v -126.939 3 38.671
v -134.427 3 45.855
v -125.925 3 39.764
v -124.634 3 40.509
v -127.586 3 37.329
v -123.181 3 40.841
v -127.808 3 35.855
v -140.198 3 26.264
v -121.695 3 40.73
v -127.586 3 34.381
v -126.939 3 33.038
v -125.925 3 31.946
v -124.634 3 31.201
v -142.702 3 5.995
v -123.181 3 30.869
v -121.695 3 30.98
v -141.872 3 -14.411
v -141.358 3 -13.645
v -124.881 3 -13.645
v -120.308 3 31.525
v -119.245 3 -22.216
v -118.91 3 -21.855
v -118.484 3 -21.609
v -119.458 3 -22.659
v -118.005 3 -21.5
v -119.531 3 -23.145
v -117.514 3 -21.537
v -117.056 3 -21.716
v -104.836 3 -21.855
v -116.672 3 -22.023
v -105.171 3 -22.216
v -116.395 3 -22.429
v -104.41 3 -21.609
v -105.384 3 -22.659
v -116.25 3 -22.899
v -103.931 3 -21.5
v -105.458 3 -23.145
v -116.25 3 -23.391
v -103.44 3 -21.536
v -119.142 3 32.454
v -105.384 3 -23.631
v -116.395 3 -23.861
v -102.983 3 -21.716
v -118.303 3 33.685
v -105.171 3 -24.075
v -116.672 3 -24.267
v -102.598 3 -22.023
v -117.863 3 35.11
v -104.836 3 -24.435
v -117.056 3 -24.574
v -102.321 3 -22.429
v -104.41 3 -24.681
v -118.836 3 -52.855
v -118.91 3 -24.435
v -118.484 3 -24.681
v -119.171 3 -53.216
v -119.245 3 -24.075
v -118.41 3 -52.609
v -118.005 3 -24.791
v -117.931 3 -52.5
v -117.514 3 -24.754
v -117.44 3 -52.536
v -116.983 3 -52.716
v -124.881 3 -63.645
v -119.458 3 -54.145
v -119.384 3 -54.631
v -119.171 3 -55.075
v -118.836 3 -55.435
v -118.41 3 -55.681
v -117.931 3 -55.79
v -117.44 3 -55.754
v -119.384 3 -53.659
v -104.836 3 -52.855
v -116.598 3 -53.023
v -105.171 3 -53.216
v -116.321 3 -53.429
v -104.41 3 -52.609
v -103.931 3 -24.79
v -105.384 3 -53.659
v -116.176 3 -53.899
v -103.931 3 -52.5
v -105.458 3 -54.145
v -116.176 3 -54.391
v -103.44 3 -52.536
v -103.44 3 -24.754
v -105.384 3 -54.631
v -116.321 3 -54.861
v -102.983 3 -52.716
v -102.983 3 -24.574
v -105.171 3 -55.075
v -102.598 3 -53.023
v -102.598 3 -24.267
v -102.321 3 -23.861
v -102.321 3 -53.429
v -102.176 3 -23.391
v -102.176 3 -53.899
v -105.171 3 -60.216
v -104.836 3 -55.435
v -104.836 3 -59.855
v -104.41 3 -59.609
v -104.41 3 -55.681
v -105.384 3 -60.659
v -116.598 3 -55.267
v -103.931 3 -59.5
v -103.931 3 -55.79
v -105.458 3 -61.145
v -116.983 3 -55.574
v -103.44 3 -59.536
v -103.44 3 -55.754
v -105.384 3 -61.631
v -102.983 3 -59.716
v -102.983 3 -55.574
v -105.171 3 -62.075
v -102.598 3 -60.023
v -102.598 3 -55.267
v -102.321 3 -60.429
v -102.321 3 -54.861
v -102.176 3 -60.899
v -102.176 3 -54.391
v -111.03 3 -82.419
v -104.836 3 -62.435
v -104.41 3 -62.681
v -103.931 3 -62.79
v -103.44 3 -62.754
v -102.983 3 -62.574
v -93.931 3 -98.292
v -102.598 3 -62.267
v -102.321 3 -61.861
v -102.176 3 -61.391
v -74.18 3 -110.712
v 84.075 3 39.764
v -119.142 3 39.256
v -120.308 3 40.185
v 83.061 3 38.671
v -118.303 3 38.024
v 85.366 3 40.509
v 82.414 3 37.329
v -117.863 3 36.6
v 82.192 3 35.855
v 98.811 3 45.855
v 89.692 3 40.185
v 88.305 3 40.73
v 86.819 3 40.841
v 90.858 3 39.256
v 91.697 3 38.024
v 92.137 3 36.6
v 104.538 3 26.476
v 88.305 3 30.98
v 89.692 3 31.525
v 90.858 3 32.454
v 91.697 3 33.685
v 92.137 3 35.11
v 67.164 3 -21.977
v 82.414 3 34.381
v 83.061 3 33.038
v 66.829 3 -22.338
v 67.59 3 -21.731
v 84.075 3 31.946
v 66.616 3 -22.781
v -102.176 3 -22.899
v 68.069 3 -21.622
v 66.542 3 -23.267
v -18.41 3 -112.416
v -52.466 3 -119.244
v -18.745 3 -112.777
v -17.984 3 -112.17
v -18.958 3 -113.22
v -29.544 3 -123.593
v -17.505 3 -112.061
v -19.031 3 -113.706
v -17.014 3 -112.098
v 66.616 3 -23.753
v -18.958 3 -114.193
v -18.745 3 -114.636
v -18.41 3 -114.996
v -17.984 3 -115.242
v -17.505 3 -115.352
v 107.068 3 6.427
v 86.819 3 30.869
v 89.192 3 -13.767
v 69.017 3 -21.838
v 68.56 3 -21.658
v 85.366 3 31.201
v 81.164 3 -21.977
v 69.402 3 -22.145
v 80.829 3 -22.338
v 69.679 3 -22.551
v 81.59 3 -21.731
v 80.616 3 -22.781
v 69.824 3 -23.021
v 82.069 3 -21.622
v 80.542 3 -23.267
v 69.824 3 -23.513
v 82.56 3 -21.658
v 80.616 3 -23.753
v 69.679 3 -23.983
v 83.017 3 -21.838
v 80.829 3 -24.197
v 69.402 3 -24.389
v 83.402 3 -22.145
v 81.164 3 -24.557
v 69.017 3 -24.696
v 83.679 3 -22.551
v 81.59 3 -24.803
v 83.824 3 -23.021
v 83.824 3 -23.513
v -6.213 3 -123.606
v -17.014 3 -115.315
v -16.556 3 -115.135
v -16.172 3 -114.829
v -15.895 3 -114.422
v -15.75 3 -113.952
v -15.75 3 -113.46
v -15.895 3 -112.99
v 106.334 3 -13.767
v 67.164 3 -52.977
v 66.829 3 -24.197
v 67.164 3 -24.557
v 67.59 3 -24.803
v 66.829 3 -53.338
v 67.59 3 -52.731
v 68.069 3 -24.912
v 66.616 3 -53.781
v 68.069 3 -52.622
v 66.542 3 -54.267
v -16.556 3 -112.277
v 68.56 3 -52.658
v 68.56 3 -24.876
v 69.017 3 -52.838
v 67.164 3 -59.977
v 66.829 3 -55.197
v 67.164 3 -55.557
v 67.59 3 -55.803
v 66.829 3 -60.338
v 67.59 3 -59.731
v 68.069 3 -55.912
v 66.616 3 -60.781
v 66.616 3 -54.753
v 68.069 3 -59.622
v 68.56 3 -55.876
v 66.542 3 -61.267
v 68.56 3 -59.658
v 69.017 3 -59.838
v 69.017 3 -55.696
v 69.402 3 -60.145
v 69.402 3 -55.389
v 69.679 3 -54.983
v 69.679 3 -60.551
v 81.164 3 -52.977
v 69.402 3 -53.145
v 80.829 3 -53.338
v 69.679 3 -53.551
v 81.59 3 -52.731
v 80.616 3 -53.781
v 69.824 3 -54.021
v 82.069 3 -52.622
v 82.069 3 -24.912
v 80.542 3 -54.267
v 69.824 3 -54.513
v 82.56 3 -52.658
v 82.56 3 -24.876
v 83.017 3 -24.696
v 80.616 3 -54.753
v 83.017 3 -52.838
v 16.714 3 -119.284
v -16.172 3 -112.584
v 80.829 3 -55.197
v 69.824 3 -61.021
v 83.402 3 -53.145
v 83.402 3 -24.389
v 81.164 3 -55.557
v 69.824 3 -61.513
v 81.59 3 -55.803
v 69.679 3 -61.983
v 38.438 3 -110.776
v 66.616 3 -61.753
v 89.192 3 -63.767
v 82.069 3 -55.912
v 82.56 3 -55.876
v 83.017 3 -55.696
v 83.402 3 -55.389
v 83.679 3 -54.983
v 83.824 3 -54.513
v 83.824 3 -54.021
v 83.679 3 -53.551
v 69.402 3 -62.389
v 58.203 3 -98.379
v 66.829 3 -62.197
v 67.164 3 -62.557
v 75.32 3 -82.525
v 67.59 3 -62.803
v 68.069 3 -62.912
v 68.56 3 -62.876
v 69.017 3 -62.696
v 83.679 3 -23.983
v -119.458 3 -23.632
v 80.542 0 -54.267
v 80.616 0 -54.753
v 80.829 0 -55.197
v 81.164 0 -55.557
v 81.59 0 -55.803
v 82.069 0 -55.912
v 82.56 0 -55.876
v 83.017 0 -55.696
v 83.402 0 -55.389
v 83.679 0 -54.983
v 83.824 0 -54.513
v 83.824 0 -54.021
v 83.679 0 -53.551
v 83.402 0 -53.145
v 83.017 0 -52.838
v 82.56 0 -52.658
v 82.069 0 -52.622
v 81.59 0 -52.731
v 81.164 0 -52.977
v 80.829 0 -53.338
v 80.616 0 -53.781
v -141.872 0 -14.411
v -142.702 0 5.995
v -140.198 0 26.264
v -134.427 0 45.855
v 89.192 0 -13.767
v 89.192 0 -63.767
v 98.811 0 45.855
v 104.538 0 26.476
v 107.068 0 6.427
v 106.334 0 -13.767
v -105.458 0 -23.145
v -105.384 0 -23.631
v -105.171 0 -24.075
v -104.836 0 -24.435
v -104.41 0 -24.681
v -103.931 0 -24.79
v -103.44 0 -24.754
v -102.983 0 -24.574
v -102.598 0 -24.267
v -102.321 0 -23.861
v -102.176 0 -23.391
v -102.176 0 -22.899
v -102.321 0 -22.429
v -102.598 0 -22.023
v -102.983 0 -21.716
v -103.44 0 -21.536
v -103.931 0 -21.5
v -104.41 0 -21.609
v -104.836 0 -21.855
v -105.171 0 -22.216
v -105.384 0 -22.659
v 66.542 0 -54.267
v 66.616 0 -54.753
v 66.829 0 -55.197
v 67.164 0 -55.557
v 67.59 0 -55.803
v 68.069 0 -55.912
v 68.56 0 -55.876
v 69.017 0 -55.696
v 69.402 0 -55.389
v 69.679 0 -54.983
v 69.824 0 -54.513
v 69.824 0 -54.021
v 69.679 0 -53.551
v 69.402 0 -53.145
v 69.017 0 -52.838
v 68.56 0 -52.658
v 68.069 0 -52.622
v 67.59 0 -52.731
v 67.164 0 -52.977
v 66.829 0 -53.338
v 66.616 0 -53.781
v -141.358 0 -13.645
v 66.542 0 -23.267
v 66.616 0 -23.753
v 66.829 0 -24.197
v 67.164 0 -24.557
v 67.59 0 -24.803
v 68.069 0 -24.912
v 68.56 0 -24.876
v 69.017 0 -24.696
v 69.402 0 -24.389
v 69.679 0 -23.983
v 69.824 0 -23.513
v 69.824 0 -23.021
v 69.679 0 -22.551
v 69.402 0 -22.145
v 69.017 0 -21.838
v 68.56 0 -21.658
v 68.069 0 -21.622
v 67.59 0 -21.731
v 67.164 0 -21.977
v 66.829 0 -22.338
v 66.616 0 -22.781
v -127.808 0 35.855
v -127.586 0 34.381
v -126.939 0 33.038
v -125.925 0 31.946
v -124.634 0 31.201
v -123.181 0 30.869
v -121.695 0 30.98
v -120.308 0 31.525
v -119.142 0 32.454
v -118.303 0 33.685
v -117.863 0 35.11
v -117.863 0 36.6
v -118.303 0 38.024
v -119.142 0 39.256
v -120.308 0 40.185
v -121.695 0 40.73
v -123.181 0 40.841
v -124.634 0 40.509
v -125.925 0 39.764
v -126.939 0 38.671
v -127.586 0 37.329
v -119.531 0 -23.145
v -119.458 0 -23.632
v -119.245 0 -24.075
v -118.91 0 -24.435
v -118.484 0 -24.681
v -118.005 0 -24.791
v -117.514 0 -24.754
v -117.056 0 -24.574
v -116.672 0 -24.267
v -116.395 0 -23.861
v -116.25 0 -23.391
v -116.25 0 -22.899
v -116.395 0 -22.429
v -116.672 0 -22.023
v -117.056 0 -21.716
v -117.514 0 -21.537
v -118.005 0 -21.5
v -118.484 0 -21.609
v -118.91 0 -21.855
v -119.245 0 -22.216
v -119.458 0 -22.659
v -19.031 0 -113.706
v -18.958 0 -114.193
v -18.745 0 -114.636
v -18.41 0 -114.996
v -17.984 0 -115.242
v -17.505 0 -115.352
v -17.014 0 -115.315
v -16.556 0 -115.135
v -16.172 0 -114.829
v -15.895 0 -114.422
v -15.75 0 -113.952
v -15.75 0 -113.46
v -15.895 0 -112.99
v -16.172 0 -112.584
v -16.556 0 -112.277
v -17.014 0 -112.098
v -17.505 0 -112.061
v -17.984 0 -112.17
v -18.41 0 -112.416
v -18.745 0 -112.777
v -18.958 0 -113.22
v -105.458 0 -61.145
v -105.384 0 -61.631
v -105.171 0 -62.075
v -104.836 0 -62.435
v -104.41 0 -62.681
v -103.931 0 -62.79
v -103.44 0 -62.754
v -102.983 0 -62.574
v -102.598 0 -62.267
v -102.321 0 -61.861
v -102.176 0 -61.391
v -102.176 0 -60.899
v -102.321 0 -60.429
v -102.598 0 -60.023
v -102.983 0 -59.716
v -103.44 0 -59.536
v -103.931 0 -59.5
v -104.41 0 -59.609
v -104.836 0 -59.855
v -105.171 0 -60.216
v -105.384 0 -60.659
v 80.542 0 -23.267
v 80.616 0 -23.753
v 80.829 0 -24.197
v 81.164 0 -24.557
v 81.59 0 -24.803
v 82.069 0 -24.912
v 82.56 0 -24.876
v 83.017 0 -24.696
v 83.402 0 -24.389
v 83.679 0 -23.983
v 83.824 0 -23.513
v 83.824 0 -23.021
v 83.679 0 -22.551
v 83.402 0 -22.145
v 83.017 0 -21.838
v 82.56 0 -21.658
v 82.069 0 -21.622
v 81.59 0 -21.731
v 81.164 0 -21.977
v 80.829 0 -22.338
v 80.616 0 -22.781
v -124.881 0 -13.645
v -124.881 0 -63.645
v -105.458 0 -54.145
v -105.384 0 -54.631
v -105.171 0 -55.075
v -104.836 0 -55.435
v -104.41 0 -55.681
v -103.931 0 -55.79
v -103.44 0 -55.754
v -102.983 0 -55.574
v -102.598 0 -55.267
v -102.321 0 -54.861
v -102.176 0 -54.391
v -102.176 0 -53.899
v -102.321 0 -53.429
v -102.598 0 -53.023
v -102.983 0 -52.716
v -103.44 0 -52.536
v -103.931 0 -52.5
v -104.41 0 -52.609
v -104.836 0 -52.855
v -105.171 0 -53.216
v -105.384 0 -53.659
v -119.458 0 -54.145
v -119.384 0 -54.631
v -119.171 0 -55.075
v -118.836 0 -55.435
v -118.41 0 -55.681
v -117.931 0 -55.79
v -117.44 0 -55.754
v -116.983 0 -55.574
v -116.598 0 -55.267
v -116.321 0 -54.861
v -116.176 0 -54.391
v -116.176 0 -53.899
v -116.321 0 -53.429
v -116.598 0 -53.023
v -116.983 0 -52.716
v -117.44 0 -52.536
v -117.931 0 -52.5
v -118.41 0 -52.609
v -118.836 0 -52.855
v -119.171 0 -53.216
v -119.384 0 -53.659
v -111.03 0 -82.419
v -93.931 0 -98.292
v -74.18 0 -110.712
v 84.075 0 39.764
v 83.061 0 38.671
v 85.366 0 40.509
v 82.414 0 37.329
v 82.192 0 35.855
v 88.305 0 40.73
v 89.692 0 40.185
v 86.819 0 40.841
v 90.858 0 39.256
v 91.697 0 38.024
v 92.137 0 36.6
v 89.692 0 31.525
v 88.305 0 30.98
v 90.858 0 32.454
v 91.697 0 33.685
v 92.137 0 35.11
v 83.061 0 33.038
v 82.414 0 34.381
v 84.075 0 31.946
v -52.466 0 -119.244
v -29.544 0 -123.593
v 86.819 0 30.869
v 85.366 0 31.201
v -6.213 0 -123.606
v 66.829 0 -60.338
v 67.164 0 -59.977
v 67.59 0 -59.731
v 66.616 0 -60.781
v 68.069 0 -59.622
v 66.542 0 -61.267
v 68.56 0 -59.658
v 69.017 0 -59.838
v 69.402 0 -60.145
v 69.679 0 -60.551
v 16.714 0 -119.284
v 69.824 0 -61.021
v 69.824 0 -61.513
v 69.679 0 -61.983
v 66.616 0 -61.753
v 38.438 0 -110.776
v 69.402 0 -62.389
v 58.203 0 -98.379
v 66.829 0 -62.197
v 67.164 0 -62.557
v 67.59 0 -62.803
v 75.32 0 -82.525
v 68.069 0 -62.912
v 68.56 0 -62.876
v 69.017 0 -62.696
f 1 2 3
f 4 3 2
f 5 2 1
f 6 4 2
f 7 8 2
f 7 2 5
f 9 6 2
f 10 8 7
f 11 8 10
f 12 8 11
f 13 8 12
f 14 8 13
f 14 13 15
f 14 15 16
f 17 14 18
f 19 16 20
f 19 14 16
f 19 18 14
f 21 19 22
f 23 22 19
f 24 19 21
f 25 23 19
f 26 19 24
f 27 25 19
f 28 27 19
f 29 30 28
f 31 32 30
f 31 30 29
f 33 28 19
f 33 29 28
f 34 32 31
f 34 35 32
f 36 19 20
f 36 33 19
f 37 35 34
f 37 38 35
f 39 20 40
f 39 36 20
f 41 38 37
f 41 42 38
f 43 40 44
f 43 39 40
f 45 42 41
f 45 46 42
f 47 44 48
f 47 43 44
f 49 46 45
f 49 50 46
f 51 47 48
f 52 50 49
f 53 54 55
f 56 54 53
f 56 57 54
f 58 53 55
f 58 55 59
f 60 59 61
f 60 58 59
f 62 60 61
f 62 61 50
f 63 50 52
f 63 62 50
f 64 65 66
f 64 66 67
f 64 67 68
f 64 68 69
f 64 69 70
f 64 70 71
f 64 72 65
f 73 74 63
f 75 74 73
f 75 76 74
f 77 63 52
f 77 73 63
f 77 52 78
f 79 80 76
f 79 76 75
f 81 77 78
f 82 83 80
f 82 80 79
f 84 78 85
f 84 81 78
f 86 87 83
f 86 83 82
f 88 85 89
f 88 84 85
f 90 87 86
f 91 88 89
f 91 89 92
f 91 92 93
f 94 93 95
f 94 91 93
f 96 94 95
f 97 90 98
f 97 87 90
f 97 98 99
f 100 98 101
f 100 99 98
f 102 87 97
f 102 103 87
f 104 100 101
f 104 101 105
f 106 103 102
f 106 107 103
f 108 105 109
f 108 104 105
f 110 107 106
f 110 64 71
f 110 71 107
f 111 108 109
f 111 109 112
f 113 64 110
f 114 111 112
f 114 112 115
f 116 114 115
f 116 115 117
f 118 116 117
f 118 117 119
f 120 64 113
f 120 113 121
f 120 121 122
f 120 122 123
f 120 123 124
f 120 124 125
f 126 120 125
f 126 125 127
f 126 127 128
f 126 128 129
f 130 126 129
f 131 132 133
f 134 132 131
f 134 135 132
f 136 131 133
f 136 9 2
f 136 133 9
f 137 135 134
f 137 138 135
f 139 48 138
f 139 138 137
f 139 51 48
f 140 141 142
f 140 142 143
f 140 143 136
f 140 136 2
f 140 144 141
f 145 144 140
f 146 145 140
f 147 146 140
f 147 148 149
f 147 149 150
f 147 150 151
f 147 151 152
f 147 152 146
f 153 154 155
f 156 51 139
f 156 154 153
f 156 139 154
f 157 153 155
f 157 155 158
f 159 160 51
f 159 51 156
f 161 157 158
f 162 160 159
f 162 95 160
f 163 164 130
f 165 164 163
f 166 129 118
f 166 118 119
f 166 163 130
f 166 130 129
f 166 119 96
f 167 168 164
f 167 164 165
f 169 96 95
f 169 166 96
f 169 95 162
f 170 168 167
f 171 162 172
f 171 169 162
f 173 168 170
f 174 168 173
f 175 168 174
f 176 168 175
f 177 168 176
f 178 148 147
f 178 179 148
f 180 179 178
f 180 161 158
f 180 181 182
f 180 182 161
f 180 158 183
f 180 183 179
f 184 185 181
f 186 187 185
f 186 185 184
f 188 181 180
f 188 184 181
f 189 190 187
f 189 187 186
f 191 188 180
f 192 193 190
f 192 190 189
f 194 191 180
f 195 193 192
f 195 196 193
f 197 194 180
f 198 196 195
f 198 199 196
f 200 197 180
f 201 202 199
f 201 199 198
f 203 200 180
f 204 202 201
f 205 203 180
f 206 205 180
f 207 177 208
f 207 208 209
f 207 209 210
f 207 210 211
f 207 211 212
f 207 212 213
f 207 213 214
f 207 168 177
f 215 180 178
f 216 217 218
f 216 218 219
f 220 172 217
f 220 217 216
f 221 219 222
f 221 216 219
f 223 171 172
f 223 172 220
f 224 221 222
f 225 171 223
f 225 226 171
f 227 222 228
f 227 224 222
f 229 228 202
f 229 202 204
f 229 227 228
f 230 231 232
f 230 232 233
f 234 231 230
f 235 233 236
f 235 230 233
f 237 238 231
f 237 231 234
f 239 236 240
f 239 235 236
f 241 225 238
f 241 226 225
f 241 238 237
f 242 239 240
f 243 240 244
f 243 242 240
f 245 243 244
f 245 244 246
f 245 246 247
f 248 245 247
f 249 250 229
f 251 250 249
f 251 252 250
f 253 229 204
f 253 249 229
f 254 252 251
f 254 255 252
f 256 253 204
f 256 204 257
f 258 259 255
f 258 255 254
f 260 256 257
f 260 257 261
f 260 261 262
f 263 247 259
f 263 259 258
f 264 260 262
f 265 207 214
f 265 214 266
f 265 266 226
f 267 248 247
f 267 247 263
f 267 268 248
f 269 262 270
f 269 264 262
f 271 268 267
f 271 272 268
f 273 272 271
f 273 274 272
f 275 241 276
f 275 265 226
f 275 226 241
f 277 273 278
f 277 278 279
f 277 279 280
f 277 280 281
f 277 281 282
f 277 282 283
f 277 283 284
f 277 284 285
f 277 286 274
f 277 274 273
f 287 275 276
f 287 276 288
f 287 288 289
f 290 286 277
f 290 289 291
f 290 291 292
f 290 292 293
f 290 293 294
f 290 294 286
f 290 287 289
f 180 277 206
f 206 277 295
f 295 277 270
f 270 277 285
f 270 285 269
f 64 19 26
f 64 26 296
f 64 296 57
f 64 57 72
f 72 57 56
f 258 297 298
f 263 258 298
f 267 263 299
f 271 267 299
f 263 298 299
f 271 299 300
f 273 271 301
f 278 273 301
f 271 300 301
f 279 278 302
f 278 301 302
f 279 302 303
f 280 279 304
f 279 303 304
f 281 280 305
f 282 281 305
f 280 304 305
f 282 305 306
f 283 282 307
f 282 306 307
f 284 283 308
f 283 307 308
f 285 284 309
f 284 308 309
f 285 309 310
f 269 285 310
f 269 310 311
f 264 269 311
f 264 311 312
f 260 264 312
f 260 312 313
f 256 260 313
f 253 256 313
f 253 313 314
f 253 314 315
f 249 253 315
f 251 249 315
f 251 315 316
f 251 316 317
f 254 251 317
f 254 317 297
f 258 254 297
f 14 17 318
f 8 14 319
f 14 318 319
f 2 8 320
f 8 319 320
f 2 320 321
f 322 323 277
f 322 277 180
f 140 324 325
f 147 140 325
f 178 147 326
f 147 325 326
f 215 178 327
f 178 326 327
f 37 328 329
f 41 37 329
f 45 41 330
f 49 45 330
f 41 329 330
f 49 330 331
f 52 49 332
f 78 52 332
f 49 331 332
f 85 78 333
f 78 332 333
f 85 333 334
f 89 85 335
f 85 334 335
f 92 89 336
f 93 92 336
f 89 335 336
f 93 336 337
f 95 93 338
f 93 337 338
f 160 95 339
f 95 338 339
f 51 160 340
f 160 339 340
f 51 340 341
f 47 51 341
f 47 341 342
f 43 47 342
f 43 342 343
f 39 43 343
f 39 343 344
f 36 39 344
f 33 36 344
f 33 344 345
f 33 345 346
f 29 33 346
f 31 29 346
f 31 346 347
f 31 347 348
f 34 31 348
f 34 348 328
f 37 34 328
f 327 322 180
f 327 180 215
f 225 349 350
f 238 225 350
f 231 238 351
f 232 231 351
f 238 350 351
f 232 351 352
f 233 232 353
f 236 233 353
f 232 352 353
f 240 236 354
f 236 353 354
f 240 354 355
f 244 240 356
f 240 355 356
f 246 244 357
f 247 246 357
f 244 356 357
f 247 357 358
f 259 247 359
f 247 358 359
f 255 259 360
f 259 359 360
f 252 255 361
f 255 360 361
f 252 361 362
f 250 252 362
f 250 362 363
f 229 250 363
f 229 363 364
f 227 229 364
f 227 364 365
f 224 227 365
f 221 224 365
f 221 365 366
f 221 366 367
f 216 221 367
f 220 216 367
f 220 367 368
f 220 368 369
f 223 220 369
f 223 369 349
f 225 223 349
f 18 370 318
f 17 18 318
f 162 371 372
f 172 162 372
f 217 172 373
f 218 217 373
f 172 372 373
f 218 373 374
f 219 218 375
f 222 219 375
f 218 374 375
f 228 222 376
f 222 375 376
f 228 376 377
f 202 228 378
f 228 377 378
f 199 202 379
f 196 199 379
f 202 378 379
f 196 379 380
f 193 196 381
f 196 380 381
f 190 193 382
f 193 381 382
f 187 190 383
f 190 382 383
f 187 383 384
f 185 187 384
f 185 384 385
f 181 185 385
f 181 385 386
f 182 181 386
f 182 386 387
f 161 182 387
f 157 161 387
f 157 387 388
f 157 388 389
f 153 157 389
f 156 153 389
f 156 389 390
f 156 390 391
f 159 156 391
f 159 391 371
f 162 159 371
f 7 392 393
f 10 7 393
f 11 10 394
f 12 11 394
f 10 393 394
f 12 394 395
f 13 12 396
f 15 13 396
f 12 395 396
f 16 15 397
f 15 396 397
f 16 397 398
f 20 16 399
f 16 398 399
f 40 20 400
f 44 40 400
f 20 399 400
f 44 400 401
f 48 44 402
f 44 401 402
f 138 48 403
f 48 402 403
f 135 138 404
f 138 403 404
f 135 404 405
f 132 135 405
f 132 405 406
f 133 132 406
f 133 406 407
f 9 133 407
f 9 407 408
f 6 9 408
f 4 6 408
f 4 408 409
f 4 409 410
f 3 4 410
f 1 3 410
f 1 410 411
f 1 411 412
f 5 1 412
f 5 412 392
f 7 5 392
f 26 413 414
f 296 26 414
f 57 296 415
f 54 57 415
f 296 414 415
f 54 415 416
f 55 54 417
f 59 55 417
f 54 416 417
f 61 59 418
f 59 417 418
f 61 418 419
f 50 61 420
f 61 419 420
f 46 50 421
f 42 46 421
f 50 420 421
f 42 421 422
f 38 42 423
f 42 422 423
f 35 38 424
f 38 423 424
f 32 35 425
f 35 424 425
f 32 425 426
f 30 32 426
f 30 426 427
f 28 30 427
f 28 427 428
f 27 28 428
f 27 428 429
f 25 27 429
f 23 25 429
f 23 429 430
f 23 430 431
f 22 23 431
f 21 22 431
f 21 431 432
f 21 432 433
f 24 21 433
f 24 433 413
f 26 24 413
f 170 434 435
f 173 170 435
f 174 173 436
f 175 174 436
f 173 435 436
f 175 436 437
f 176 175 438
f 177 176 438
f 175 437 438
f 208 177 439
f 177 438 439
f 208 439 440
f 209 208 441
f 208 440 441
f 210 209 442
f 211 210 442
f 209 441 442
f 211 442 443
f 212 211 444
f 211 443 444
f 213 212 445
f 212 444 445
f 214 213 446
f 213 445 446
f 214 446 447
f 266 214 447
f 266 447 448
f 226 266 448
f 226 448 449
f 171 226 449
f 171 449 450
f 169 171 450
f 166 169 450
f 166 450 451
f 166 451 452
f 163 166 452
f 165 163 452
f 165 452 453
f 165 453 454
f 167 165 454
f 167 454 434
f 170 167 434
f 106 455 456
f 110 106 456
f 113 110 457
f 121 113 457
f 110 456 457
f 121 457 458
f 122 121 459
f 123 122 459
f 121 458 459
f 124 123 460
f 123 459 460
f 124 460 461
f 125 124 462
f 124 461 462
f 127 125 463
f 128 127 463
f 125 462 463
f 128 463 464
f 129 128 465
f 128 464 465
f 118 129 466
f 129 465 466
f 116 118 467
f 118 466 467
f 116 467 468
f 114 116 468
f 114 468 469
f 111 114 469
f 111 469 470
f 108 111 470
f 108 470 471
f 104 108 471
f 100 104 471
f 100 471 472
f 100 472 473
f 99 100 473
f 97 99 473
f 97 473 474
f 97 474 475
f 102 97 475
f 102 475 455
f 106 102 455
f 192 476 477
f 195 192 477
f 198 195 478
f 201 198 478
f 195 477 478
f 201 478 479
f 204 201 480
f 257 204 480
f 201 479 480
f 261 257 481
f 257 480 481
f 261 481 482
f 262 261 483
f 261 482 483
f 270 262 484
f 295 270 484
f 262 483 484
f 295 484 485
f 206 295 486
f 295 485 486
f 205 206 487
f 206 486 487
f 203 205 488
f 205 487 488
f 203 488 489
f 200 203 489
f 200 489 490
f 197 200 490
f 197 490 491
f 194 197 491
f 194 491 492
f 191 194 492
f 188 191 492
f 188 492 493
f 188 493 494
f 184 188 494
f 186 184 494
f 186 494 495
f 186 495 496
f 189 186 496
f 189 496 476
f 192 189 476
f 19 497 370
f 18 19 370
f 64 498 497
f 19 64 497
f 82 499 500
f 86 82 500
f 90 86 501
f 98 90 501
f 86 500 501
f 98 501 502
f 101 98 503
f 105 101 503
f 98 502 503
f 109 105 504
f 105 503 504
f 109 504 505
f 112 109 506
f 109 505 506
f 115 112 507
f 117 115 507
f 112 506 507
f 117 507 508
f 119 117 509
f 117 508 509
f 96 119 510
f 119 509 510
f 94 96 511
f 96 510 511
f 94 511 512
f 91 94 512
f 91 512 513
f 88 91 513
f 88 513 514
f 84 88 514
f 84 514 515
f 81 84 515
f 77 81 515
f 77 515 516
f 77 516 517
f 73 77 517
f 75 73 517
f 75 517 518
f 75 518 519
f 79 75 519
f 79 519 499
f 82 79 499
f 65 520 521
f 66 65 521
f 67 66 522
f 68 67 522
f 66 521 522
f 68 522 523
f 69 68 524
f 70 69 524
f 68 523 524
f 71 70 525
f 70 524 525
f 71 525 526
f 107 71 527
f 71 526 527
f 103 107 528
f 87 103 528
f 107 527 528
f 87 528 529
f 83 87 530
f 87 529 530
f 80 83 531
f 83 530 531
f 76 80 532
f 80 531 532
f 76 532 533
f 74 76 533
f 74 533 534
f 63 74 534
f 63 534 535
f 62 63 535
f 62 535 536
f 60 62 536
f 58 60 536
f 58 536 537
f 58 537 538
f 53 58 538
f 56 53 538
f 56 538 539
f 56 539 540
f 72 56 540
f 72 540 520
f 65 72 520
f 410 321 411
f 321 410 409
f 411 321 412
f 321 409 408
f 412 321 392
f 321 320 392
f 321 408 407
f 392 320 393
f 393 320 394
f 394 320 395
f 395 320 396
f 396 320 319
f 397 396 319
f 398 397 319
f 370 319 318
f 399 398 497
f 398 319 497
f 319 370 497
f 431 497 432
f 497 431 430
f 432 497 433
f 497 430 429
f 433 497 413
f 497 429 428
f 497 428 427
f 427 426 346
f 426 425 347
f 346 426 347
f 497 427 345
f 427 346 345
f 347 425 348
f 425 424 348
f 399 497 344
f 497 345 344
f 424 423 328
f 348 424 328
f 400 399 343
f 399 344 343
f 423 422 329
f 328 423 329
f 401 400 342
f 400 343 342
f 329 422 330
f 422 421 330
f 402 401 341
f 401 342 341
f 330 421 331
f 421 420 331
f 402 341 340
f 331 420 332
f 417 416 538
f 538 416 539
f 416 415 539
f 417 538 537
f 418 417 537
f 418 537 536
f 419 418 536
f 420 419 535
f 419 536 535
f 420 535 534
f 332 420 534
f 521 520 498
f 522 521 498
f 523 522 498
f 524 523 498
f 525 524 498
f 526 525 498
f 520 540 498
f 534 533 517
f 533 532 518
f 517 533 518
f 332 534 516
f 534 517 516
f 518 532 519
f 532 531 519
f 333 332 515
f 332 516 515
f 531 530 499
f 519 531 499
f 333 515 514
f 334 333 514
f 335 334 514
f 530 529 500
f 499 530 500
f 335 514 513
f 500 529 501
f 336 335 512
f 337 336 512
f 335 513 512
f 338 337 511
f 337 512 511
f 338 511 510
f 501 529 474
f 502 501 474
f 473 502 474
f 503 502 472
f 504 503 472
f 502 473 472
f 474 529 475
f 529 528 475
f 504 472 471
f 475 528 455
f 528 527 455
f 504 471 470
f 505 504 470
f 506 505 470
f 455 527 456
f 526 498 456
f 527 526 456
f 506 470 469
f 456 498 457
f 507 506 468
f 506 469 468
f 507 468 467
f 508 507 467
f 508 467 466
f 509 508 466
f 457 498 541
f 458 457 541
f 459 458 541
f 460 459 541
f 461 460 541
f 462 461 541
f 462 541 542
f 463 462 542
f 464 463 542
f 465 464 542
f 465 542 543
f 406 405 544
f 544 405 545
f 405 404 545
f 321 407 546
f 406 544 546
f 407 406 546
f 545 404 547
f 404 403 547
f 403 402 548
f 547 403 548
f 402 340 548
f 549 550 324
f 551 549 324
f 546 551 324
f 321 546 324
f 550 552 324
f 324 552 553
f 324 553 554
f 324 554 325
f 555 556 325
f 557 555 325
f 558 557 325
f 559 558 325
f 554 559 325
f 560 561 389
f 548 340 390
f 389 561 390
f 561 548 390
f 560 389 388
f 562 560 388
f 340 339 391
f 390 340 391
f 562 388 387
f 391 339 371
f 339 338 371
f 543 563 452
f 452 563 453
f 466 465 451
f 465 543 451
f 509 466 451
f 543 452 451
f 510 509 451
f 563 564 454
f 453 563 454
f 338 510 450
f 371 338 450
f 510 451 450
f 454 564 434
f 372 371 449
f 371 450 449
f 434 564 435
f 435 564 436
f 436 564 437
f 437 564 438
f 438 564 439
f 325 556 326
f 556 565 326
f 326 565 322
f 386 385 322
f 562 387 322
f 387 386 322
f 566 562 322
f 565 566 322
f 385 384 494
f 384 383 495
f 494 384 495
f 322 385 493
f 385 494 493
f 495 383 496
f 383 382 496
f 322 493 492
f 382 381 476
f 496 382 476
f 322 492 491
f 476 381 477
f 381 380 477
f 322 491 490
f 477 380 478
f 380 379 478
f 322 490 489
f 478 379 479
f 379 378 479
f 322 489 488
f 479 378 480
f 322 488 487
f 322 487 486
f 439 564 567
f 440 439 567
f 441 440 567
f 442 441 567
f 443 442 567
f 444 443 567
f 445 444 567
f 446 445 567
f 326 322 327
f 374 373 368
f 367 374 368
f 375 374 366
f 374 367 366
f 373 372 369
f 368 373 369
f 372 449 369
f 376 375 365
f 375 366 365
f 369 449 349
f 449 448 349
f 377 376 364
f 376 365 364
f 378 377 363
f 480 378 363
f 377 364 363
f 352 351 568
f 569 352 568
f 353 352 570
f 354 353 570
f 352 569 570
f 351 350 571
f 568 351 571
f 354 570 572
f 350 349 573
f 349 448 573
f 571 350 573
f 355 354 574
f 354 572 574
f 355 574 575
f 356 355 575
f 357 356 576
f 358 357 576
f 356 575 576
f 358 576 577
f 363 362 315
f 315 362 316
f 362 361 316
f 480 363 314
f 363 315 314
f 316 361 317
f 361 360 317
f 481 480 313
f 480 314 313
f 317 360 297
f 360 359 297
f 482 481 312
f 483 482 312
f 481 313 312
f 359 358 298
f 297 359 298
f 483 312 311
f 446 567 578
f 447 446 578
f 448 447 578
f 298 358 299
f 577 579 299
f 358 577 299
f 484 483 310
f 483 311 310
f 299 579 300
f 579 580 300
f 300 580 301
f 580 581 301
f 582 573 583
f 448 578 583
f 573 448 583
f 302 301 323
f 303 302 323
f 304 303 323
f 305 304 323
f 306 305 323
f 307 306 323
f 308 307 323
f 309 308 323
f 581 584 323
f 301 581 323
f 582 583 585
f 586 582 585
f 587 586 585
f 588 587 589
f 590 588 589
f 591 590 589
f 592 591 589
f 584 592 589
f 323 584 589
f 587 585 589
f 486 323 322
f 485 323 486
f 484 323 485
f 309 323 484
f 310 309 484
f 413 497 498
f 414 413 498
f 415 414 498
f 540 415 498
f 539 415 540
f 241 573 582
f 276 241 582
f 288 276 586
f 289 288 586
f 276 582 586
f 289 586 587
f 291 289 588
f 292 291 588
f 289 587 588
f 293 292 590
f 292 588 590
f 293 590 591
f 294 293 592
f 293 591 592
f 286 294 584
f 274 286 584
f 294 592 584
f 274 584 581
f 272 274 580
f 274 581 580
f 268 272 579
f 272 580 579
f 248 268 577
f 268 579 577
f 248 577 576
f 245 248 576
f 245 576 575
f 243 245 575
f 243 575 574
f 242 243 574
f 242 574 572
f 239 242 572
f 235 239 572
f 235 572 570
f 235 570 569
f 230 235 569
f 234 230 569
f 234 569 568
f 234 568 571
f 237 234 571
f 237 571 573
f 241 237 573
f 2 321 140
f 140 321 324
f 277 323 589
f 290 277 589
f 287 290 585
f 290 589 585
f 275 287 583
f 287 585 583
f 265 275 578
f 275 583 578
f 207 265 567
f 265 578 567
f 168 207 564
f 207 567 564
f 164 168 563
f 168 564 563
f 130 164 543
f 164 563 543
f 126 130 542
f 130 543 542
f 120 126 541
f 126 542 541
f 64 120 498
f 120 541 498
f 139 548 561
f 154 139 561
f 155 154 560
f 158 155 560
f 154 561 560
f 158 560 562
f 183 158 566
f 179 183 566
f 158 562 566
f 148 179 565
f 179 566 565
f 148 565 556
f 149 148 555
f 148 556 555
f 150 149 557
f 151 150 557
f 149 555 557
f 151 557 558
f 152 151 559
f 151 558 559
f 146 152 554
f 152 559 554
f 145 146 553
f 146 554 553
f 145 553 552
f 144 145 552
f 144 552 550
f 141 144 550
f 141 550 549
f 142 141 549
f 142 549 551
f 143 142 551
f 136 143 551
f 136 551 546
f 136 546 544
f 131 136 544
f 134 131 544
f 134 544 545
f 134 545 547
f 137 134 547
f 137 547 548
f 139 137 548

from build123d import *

# Parameters (mm, degrees)
SKETCH2_R           = 125
BOSS_EXTRUDE1_DEPTH = 3
CUT_EXTRUDE1_DEPTH  = 3
SKETCH4_R           = 1.65
SKETCH4_R_2         = 5
CUT_EXTRUDE2_DEPTH  = 10
SKETCH6_R           = 1.65
CUT_EXTRUDE3_DEPTH  = 100


with BuildPart() as part:
    # Sketch2 → Boss-Extrude1 (new body)
    with BuildSketch(Plane(origin=(0, 0, 0), x_dir=(1, 0, 0), z_dir=(0, 1, 0))):
        with Locations((-17.80765369, -0.854894607)):
            Circle(SKETCH2_R)
    extrude(amount=BOSS_EXTRUDE1_DEPTH)

    # Sketch3 → Cut-Extrude1 (cut)
    with BuildSketch(Plane.XZ):
        Polygon((-735.289651923, 45.854894607), (-134.426691587, 45.854894607), (98.811384207, 45.854894607), (699.674344543, 45.854894607), (699.674344543, 1247.580815278), (-735.289651923, 1247.580815278), align=None)
    extrude(amount=-CUT_EXTRUDE1_DEPTH, mode=Mode.SUBTRACT)

    # Sketch4 → Cut-Extrude2 (cut)
    with BuildSketch(Plane(origin=(0, 0, 0), x_dir=(-1, 0, 0), z_dir=(0, -1, 0))):
        with Locations((117.80765369, 54.145105393)):
            Circle(SKETCH4_R)
        with Locations((117.881226527, 23.145192699)):
            Circle(SKETCH4_R)
        with Locations((103.80765369, 54.145105393)):
            Circle(SKETCH4_R)
        with Locations((103.80765369, 23.145105393)):
            Circle(SKETCH4_R)
        with Locations((-68.19234631, 54.267083079)):
            Circle(SKETCH4_R)
        with Locations((-82.19234631, 54.267083079)):
            Circle(SKETCH4_R)
        with Locations((-82.19234631, 23.267083079)):
            Circle(SKETCH4_R)
        with Locations((-68.19234631, 23.267083079)):
            Circle(SKETCH4_R)
        with Locations((122.80765369, -35.854894607)):
            Circle(SKETCH4_R_2)
        with Locations((-87.19234631, -35.854894607)):
            Circle(SKETCH4_R_2)
        Polygon((124.881226527, 63.645105393), (124.881226527, 13.645105393), (141.357501756, 13.645105393), (159.377606719, 40.481299306), align=None)
        Polygon((-89.19234631, 63.767083079), (-89.19234631, 13.767083079), (-106.334191667, 13.767083079), (-114.079843912, 54.596315864), align=None)
    extrude(amount=-CUT_EXTRUDE2_DEPTH, mode=Mode.SUBTRACT)

    # Sketch6 → Cut-Extrude3 (cut)
    with BuildSketch(Plane(origin=(0, 0, 0), x_dir=(-1, 0, 0), z_dir=(0, -1, 0))):
        with Locations((103.80765369, 61.145105393)):
            Circle(SKETCH6_R)
        with Locations((-68.19234631, 61.267083079)):
            Circle(SKETCH6_R)
        with Locations((17.381226527, 113.706374405)):
            Circle(SKETCH6_R)
    extrude(amount=-CUT_EXTRUDE3_DEPTH, mode=Mode.SUBTRACT)


solid = part.part
